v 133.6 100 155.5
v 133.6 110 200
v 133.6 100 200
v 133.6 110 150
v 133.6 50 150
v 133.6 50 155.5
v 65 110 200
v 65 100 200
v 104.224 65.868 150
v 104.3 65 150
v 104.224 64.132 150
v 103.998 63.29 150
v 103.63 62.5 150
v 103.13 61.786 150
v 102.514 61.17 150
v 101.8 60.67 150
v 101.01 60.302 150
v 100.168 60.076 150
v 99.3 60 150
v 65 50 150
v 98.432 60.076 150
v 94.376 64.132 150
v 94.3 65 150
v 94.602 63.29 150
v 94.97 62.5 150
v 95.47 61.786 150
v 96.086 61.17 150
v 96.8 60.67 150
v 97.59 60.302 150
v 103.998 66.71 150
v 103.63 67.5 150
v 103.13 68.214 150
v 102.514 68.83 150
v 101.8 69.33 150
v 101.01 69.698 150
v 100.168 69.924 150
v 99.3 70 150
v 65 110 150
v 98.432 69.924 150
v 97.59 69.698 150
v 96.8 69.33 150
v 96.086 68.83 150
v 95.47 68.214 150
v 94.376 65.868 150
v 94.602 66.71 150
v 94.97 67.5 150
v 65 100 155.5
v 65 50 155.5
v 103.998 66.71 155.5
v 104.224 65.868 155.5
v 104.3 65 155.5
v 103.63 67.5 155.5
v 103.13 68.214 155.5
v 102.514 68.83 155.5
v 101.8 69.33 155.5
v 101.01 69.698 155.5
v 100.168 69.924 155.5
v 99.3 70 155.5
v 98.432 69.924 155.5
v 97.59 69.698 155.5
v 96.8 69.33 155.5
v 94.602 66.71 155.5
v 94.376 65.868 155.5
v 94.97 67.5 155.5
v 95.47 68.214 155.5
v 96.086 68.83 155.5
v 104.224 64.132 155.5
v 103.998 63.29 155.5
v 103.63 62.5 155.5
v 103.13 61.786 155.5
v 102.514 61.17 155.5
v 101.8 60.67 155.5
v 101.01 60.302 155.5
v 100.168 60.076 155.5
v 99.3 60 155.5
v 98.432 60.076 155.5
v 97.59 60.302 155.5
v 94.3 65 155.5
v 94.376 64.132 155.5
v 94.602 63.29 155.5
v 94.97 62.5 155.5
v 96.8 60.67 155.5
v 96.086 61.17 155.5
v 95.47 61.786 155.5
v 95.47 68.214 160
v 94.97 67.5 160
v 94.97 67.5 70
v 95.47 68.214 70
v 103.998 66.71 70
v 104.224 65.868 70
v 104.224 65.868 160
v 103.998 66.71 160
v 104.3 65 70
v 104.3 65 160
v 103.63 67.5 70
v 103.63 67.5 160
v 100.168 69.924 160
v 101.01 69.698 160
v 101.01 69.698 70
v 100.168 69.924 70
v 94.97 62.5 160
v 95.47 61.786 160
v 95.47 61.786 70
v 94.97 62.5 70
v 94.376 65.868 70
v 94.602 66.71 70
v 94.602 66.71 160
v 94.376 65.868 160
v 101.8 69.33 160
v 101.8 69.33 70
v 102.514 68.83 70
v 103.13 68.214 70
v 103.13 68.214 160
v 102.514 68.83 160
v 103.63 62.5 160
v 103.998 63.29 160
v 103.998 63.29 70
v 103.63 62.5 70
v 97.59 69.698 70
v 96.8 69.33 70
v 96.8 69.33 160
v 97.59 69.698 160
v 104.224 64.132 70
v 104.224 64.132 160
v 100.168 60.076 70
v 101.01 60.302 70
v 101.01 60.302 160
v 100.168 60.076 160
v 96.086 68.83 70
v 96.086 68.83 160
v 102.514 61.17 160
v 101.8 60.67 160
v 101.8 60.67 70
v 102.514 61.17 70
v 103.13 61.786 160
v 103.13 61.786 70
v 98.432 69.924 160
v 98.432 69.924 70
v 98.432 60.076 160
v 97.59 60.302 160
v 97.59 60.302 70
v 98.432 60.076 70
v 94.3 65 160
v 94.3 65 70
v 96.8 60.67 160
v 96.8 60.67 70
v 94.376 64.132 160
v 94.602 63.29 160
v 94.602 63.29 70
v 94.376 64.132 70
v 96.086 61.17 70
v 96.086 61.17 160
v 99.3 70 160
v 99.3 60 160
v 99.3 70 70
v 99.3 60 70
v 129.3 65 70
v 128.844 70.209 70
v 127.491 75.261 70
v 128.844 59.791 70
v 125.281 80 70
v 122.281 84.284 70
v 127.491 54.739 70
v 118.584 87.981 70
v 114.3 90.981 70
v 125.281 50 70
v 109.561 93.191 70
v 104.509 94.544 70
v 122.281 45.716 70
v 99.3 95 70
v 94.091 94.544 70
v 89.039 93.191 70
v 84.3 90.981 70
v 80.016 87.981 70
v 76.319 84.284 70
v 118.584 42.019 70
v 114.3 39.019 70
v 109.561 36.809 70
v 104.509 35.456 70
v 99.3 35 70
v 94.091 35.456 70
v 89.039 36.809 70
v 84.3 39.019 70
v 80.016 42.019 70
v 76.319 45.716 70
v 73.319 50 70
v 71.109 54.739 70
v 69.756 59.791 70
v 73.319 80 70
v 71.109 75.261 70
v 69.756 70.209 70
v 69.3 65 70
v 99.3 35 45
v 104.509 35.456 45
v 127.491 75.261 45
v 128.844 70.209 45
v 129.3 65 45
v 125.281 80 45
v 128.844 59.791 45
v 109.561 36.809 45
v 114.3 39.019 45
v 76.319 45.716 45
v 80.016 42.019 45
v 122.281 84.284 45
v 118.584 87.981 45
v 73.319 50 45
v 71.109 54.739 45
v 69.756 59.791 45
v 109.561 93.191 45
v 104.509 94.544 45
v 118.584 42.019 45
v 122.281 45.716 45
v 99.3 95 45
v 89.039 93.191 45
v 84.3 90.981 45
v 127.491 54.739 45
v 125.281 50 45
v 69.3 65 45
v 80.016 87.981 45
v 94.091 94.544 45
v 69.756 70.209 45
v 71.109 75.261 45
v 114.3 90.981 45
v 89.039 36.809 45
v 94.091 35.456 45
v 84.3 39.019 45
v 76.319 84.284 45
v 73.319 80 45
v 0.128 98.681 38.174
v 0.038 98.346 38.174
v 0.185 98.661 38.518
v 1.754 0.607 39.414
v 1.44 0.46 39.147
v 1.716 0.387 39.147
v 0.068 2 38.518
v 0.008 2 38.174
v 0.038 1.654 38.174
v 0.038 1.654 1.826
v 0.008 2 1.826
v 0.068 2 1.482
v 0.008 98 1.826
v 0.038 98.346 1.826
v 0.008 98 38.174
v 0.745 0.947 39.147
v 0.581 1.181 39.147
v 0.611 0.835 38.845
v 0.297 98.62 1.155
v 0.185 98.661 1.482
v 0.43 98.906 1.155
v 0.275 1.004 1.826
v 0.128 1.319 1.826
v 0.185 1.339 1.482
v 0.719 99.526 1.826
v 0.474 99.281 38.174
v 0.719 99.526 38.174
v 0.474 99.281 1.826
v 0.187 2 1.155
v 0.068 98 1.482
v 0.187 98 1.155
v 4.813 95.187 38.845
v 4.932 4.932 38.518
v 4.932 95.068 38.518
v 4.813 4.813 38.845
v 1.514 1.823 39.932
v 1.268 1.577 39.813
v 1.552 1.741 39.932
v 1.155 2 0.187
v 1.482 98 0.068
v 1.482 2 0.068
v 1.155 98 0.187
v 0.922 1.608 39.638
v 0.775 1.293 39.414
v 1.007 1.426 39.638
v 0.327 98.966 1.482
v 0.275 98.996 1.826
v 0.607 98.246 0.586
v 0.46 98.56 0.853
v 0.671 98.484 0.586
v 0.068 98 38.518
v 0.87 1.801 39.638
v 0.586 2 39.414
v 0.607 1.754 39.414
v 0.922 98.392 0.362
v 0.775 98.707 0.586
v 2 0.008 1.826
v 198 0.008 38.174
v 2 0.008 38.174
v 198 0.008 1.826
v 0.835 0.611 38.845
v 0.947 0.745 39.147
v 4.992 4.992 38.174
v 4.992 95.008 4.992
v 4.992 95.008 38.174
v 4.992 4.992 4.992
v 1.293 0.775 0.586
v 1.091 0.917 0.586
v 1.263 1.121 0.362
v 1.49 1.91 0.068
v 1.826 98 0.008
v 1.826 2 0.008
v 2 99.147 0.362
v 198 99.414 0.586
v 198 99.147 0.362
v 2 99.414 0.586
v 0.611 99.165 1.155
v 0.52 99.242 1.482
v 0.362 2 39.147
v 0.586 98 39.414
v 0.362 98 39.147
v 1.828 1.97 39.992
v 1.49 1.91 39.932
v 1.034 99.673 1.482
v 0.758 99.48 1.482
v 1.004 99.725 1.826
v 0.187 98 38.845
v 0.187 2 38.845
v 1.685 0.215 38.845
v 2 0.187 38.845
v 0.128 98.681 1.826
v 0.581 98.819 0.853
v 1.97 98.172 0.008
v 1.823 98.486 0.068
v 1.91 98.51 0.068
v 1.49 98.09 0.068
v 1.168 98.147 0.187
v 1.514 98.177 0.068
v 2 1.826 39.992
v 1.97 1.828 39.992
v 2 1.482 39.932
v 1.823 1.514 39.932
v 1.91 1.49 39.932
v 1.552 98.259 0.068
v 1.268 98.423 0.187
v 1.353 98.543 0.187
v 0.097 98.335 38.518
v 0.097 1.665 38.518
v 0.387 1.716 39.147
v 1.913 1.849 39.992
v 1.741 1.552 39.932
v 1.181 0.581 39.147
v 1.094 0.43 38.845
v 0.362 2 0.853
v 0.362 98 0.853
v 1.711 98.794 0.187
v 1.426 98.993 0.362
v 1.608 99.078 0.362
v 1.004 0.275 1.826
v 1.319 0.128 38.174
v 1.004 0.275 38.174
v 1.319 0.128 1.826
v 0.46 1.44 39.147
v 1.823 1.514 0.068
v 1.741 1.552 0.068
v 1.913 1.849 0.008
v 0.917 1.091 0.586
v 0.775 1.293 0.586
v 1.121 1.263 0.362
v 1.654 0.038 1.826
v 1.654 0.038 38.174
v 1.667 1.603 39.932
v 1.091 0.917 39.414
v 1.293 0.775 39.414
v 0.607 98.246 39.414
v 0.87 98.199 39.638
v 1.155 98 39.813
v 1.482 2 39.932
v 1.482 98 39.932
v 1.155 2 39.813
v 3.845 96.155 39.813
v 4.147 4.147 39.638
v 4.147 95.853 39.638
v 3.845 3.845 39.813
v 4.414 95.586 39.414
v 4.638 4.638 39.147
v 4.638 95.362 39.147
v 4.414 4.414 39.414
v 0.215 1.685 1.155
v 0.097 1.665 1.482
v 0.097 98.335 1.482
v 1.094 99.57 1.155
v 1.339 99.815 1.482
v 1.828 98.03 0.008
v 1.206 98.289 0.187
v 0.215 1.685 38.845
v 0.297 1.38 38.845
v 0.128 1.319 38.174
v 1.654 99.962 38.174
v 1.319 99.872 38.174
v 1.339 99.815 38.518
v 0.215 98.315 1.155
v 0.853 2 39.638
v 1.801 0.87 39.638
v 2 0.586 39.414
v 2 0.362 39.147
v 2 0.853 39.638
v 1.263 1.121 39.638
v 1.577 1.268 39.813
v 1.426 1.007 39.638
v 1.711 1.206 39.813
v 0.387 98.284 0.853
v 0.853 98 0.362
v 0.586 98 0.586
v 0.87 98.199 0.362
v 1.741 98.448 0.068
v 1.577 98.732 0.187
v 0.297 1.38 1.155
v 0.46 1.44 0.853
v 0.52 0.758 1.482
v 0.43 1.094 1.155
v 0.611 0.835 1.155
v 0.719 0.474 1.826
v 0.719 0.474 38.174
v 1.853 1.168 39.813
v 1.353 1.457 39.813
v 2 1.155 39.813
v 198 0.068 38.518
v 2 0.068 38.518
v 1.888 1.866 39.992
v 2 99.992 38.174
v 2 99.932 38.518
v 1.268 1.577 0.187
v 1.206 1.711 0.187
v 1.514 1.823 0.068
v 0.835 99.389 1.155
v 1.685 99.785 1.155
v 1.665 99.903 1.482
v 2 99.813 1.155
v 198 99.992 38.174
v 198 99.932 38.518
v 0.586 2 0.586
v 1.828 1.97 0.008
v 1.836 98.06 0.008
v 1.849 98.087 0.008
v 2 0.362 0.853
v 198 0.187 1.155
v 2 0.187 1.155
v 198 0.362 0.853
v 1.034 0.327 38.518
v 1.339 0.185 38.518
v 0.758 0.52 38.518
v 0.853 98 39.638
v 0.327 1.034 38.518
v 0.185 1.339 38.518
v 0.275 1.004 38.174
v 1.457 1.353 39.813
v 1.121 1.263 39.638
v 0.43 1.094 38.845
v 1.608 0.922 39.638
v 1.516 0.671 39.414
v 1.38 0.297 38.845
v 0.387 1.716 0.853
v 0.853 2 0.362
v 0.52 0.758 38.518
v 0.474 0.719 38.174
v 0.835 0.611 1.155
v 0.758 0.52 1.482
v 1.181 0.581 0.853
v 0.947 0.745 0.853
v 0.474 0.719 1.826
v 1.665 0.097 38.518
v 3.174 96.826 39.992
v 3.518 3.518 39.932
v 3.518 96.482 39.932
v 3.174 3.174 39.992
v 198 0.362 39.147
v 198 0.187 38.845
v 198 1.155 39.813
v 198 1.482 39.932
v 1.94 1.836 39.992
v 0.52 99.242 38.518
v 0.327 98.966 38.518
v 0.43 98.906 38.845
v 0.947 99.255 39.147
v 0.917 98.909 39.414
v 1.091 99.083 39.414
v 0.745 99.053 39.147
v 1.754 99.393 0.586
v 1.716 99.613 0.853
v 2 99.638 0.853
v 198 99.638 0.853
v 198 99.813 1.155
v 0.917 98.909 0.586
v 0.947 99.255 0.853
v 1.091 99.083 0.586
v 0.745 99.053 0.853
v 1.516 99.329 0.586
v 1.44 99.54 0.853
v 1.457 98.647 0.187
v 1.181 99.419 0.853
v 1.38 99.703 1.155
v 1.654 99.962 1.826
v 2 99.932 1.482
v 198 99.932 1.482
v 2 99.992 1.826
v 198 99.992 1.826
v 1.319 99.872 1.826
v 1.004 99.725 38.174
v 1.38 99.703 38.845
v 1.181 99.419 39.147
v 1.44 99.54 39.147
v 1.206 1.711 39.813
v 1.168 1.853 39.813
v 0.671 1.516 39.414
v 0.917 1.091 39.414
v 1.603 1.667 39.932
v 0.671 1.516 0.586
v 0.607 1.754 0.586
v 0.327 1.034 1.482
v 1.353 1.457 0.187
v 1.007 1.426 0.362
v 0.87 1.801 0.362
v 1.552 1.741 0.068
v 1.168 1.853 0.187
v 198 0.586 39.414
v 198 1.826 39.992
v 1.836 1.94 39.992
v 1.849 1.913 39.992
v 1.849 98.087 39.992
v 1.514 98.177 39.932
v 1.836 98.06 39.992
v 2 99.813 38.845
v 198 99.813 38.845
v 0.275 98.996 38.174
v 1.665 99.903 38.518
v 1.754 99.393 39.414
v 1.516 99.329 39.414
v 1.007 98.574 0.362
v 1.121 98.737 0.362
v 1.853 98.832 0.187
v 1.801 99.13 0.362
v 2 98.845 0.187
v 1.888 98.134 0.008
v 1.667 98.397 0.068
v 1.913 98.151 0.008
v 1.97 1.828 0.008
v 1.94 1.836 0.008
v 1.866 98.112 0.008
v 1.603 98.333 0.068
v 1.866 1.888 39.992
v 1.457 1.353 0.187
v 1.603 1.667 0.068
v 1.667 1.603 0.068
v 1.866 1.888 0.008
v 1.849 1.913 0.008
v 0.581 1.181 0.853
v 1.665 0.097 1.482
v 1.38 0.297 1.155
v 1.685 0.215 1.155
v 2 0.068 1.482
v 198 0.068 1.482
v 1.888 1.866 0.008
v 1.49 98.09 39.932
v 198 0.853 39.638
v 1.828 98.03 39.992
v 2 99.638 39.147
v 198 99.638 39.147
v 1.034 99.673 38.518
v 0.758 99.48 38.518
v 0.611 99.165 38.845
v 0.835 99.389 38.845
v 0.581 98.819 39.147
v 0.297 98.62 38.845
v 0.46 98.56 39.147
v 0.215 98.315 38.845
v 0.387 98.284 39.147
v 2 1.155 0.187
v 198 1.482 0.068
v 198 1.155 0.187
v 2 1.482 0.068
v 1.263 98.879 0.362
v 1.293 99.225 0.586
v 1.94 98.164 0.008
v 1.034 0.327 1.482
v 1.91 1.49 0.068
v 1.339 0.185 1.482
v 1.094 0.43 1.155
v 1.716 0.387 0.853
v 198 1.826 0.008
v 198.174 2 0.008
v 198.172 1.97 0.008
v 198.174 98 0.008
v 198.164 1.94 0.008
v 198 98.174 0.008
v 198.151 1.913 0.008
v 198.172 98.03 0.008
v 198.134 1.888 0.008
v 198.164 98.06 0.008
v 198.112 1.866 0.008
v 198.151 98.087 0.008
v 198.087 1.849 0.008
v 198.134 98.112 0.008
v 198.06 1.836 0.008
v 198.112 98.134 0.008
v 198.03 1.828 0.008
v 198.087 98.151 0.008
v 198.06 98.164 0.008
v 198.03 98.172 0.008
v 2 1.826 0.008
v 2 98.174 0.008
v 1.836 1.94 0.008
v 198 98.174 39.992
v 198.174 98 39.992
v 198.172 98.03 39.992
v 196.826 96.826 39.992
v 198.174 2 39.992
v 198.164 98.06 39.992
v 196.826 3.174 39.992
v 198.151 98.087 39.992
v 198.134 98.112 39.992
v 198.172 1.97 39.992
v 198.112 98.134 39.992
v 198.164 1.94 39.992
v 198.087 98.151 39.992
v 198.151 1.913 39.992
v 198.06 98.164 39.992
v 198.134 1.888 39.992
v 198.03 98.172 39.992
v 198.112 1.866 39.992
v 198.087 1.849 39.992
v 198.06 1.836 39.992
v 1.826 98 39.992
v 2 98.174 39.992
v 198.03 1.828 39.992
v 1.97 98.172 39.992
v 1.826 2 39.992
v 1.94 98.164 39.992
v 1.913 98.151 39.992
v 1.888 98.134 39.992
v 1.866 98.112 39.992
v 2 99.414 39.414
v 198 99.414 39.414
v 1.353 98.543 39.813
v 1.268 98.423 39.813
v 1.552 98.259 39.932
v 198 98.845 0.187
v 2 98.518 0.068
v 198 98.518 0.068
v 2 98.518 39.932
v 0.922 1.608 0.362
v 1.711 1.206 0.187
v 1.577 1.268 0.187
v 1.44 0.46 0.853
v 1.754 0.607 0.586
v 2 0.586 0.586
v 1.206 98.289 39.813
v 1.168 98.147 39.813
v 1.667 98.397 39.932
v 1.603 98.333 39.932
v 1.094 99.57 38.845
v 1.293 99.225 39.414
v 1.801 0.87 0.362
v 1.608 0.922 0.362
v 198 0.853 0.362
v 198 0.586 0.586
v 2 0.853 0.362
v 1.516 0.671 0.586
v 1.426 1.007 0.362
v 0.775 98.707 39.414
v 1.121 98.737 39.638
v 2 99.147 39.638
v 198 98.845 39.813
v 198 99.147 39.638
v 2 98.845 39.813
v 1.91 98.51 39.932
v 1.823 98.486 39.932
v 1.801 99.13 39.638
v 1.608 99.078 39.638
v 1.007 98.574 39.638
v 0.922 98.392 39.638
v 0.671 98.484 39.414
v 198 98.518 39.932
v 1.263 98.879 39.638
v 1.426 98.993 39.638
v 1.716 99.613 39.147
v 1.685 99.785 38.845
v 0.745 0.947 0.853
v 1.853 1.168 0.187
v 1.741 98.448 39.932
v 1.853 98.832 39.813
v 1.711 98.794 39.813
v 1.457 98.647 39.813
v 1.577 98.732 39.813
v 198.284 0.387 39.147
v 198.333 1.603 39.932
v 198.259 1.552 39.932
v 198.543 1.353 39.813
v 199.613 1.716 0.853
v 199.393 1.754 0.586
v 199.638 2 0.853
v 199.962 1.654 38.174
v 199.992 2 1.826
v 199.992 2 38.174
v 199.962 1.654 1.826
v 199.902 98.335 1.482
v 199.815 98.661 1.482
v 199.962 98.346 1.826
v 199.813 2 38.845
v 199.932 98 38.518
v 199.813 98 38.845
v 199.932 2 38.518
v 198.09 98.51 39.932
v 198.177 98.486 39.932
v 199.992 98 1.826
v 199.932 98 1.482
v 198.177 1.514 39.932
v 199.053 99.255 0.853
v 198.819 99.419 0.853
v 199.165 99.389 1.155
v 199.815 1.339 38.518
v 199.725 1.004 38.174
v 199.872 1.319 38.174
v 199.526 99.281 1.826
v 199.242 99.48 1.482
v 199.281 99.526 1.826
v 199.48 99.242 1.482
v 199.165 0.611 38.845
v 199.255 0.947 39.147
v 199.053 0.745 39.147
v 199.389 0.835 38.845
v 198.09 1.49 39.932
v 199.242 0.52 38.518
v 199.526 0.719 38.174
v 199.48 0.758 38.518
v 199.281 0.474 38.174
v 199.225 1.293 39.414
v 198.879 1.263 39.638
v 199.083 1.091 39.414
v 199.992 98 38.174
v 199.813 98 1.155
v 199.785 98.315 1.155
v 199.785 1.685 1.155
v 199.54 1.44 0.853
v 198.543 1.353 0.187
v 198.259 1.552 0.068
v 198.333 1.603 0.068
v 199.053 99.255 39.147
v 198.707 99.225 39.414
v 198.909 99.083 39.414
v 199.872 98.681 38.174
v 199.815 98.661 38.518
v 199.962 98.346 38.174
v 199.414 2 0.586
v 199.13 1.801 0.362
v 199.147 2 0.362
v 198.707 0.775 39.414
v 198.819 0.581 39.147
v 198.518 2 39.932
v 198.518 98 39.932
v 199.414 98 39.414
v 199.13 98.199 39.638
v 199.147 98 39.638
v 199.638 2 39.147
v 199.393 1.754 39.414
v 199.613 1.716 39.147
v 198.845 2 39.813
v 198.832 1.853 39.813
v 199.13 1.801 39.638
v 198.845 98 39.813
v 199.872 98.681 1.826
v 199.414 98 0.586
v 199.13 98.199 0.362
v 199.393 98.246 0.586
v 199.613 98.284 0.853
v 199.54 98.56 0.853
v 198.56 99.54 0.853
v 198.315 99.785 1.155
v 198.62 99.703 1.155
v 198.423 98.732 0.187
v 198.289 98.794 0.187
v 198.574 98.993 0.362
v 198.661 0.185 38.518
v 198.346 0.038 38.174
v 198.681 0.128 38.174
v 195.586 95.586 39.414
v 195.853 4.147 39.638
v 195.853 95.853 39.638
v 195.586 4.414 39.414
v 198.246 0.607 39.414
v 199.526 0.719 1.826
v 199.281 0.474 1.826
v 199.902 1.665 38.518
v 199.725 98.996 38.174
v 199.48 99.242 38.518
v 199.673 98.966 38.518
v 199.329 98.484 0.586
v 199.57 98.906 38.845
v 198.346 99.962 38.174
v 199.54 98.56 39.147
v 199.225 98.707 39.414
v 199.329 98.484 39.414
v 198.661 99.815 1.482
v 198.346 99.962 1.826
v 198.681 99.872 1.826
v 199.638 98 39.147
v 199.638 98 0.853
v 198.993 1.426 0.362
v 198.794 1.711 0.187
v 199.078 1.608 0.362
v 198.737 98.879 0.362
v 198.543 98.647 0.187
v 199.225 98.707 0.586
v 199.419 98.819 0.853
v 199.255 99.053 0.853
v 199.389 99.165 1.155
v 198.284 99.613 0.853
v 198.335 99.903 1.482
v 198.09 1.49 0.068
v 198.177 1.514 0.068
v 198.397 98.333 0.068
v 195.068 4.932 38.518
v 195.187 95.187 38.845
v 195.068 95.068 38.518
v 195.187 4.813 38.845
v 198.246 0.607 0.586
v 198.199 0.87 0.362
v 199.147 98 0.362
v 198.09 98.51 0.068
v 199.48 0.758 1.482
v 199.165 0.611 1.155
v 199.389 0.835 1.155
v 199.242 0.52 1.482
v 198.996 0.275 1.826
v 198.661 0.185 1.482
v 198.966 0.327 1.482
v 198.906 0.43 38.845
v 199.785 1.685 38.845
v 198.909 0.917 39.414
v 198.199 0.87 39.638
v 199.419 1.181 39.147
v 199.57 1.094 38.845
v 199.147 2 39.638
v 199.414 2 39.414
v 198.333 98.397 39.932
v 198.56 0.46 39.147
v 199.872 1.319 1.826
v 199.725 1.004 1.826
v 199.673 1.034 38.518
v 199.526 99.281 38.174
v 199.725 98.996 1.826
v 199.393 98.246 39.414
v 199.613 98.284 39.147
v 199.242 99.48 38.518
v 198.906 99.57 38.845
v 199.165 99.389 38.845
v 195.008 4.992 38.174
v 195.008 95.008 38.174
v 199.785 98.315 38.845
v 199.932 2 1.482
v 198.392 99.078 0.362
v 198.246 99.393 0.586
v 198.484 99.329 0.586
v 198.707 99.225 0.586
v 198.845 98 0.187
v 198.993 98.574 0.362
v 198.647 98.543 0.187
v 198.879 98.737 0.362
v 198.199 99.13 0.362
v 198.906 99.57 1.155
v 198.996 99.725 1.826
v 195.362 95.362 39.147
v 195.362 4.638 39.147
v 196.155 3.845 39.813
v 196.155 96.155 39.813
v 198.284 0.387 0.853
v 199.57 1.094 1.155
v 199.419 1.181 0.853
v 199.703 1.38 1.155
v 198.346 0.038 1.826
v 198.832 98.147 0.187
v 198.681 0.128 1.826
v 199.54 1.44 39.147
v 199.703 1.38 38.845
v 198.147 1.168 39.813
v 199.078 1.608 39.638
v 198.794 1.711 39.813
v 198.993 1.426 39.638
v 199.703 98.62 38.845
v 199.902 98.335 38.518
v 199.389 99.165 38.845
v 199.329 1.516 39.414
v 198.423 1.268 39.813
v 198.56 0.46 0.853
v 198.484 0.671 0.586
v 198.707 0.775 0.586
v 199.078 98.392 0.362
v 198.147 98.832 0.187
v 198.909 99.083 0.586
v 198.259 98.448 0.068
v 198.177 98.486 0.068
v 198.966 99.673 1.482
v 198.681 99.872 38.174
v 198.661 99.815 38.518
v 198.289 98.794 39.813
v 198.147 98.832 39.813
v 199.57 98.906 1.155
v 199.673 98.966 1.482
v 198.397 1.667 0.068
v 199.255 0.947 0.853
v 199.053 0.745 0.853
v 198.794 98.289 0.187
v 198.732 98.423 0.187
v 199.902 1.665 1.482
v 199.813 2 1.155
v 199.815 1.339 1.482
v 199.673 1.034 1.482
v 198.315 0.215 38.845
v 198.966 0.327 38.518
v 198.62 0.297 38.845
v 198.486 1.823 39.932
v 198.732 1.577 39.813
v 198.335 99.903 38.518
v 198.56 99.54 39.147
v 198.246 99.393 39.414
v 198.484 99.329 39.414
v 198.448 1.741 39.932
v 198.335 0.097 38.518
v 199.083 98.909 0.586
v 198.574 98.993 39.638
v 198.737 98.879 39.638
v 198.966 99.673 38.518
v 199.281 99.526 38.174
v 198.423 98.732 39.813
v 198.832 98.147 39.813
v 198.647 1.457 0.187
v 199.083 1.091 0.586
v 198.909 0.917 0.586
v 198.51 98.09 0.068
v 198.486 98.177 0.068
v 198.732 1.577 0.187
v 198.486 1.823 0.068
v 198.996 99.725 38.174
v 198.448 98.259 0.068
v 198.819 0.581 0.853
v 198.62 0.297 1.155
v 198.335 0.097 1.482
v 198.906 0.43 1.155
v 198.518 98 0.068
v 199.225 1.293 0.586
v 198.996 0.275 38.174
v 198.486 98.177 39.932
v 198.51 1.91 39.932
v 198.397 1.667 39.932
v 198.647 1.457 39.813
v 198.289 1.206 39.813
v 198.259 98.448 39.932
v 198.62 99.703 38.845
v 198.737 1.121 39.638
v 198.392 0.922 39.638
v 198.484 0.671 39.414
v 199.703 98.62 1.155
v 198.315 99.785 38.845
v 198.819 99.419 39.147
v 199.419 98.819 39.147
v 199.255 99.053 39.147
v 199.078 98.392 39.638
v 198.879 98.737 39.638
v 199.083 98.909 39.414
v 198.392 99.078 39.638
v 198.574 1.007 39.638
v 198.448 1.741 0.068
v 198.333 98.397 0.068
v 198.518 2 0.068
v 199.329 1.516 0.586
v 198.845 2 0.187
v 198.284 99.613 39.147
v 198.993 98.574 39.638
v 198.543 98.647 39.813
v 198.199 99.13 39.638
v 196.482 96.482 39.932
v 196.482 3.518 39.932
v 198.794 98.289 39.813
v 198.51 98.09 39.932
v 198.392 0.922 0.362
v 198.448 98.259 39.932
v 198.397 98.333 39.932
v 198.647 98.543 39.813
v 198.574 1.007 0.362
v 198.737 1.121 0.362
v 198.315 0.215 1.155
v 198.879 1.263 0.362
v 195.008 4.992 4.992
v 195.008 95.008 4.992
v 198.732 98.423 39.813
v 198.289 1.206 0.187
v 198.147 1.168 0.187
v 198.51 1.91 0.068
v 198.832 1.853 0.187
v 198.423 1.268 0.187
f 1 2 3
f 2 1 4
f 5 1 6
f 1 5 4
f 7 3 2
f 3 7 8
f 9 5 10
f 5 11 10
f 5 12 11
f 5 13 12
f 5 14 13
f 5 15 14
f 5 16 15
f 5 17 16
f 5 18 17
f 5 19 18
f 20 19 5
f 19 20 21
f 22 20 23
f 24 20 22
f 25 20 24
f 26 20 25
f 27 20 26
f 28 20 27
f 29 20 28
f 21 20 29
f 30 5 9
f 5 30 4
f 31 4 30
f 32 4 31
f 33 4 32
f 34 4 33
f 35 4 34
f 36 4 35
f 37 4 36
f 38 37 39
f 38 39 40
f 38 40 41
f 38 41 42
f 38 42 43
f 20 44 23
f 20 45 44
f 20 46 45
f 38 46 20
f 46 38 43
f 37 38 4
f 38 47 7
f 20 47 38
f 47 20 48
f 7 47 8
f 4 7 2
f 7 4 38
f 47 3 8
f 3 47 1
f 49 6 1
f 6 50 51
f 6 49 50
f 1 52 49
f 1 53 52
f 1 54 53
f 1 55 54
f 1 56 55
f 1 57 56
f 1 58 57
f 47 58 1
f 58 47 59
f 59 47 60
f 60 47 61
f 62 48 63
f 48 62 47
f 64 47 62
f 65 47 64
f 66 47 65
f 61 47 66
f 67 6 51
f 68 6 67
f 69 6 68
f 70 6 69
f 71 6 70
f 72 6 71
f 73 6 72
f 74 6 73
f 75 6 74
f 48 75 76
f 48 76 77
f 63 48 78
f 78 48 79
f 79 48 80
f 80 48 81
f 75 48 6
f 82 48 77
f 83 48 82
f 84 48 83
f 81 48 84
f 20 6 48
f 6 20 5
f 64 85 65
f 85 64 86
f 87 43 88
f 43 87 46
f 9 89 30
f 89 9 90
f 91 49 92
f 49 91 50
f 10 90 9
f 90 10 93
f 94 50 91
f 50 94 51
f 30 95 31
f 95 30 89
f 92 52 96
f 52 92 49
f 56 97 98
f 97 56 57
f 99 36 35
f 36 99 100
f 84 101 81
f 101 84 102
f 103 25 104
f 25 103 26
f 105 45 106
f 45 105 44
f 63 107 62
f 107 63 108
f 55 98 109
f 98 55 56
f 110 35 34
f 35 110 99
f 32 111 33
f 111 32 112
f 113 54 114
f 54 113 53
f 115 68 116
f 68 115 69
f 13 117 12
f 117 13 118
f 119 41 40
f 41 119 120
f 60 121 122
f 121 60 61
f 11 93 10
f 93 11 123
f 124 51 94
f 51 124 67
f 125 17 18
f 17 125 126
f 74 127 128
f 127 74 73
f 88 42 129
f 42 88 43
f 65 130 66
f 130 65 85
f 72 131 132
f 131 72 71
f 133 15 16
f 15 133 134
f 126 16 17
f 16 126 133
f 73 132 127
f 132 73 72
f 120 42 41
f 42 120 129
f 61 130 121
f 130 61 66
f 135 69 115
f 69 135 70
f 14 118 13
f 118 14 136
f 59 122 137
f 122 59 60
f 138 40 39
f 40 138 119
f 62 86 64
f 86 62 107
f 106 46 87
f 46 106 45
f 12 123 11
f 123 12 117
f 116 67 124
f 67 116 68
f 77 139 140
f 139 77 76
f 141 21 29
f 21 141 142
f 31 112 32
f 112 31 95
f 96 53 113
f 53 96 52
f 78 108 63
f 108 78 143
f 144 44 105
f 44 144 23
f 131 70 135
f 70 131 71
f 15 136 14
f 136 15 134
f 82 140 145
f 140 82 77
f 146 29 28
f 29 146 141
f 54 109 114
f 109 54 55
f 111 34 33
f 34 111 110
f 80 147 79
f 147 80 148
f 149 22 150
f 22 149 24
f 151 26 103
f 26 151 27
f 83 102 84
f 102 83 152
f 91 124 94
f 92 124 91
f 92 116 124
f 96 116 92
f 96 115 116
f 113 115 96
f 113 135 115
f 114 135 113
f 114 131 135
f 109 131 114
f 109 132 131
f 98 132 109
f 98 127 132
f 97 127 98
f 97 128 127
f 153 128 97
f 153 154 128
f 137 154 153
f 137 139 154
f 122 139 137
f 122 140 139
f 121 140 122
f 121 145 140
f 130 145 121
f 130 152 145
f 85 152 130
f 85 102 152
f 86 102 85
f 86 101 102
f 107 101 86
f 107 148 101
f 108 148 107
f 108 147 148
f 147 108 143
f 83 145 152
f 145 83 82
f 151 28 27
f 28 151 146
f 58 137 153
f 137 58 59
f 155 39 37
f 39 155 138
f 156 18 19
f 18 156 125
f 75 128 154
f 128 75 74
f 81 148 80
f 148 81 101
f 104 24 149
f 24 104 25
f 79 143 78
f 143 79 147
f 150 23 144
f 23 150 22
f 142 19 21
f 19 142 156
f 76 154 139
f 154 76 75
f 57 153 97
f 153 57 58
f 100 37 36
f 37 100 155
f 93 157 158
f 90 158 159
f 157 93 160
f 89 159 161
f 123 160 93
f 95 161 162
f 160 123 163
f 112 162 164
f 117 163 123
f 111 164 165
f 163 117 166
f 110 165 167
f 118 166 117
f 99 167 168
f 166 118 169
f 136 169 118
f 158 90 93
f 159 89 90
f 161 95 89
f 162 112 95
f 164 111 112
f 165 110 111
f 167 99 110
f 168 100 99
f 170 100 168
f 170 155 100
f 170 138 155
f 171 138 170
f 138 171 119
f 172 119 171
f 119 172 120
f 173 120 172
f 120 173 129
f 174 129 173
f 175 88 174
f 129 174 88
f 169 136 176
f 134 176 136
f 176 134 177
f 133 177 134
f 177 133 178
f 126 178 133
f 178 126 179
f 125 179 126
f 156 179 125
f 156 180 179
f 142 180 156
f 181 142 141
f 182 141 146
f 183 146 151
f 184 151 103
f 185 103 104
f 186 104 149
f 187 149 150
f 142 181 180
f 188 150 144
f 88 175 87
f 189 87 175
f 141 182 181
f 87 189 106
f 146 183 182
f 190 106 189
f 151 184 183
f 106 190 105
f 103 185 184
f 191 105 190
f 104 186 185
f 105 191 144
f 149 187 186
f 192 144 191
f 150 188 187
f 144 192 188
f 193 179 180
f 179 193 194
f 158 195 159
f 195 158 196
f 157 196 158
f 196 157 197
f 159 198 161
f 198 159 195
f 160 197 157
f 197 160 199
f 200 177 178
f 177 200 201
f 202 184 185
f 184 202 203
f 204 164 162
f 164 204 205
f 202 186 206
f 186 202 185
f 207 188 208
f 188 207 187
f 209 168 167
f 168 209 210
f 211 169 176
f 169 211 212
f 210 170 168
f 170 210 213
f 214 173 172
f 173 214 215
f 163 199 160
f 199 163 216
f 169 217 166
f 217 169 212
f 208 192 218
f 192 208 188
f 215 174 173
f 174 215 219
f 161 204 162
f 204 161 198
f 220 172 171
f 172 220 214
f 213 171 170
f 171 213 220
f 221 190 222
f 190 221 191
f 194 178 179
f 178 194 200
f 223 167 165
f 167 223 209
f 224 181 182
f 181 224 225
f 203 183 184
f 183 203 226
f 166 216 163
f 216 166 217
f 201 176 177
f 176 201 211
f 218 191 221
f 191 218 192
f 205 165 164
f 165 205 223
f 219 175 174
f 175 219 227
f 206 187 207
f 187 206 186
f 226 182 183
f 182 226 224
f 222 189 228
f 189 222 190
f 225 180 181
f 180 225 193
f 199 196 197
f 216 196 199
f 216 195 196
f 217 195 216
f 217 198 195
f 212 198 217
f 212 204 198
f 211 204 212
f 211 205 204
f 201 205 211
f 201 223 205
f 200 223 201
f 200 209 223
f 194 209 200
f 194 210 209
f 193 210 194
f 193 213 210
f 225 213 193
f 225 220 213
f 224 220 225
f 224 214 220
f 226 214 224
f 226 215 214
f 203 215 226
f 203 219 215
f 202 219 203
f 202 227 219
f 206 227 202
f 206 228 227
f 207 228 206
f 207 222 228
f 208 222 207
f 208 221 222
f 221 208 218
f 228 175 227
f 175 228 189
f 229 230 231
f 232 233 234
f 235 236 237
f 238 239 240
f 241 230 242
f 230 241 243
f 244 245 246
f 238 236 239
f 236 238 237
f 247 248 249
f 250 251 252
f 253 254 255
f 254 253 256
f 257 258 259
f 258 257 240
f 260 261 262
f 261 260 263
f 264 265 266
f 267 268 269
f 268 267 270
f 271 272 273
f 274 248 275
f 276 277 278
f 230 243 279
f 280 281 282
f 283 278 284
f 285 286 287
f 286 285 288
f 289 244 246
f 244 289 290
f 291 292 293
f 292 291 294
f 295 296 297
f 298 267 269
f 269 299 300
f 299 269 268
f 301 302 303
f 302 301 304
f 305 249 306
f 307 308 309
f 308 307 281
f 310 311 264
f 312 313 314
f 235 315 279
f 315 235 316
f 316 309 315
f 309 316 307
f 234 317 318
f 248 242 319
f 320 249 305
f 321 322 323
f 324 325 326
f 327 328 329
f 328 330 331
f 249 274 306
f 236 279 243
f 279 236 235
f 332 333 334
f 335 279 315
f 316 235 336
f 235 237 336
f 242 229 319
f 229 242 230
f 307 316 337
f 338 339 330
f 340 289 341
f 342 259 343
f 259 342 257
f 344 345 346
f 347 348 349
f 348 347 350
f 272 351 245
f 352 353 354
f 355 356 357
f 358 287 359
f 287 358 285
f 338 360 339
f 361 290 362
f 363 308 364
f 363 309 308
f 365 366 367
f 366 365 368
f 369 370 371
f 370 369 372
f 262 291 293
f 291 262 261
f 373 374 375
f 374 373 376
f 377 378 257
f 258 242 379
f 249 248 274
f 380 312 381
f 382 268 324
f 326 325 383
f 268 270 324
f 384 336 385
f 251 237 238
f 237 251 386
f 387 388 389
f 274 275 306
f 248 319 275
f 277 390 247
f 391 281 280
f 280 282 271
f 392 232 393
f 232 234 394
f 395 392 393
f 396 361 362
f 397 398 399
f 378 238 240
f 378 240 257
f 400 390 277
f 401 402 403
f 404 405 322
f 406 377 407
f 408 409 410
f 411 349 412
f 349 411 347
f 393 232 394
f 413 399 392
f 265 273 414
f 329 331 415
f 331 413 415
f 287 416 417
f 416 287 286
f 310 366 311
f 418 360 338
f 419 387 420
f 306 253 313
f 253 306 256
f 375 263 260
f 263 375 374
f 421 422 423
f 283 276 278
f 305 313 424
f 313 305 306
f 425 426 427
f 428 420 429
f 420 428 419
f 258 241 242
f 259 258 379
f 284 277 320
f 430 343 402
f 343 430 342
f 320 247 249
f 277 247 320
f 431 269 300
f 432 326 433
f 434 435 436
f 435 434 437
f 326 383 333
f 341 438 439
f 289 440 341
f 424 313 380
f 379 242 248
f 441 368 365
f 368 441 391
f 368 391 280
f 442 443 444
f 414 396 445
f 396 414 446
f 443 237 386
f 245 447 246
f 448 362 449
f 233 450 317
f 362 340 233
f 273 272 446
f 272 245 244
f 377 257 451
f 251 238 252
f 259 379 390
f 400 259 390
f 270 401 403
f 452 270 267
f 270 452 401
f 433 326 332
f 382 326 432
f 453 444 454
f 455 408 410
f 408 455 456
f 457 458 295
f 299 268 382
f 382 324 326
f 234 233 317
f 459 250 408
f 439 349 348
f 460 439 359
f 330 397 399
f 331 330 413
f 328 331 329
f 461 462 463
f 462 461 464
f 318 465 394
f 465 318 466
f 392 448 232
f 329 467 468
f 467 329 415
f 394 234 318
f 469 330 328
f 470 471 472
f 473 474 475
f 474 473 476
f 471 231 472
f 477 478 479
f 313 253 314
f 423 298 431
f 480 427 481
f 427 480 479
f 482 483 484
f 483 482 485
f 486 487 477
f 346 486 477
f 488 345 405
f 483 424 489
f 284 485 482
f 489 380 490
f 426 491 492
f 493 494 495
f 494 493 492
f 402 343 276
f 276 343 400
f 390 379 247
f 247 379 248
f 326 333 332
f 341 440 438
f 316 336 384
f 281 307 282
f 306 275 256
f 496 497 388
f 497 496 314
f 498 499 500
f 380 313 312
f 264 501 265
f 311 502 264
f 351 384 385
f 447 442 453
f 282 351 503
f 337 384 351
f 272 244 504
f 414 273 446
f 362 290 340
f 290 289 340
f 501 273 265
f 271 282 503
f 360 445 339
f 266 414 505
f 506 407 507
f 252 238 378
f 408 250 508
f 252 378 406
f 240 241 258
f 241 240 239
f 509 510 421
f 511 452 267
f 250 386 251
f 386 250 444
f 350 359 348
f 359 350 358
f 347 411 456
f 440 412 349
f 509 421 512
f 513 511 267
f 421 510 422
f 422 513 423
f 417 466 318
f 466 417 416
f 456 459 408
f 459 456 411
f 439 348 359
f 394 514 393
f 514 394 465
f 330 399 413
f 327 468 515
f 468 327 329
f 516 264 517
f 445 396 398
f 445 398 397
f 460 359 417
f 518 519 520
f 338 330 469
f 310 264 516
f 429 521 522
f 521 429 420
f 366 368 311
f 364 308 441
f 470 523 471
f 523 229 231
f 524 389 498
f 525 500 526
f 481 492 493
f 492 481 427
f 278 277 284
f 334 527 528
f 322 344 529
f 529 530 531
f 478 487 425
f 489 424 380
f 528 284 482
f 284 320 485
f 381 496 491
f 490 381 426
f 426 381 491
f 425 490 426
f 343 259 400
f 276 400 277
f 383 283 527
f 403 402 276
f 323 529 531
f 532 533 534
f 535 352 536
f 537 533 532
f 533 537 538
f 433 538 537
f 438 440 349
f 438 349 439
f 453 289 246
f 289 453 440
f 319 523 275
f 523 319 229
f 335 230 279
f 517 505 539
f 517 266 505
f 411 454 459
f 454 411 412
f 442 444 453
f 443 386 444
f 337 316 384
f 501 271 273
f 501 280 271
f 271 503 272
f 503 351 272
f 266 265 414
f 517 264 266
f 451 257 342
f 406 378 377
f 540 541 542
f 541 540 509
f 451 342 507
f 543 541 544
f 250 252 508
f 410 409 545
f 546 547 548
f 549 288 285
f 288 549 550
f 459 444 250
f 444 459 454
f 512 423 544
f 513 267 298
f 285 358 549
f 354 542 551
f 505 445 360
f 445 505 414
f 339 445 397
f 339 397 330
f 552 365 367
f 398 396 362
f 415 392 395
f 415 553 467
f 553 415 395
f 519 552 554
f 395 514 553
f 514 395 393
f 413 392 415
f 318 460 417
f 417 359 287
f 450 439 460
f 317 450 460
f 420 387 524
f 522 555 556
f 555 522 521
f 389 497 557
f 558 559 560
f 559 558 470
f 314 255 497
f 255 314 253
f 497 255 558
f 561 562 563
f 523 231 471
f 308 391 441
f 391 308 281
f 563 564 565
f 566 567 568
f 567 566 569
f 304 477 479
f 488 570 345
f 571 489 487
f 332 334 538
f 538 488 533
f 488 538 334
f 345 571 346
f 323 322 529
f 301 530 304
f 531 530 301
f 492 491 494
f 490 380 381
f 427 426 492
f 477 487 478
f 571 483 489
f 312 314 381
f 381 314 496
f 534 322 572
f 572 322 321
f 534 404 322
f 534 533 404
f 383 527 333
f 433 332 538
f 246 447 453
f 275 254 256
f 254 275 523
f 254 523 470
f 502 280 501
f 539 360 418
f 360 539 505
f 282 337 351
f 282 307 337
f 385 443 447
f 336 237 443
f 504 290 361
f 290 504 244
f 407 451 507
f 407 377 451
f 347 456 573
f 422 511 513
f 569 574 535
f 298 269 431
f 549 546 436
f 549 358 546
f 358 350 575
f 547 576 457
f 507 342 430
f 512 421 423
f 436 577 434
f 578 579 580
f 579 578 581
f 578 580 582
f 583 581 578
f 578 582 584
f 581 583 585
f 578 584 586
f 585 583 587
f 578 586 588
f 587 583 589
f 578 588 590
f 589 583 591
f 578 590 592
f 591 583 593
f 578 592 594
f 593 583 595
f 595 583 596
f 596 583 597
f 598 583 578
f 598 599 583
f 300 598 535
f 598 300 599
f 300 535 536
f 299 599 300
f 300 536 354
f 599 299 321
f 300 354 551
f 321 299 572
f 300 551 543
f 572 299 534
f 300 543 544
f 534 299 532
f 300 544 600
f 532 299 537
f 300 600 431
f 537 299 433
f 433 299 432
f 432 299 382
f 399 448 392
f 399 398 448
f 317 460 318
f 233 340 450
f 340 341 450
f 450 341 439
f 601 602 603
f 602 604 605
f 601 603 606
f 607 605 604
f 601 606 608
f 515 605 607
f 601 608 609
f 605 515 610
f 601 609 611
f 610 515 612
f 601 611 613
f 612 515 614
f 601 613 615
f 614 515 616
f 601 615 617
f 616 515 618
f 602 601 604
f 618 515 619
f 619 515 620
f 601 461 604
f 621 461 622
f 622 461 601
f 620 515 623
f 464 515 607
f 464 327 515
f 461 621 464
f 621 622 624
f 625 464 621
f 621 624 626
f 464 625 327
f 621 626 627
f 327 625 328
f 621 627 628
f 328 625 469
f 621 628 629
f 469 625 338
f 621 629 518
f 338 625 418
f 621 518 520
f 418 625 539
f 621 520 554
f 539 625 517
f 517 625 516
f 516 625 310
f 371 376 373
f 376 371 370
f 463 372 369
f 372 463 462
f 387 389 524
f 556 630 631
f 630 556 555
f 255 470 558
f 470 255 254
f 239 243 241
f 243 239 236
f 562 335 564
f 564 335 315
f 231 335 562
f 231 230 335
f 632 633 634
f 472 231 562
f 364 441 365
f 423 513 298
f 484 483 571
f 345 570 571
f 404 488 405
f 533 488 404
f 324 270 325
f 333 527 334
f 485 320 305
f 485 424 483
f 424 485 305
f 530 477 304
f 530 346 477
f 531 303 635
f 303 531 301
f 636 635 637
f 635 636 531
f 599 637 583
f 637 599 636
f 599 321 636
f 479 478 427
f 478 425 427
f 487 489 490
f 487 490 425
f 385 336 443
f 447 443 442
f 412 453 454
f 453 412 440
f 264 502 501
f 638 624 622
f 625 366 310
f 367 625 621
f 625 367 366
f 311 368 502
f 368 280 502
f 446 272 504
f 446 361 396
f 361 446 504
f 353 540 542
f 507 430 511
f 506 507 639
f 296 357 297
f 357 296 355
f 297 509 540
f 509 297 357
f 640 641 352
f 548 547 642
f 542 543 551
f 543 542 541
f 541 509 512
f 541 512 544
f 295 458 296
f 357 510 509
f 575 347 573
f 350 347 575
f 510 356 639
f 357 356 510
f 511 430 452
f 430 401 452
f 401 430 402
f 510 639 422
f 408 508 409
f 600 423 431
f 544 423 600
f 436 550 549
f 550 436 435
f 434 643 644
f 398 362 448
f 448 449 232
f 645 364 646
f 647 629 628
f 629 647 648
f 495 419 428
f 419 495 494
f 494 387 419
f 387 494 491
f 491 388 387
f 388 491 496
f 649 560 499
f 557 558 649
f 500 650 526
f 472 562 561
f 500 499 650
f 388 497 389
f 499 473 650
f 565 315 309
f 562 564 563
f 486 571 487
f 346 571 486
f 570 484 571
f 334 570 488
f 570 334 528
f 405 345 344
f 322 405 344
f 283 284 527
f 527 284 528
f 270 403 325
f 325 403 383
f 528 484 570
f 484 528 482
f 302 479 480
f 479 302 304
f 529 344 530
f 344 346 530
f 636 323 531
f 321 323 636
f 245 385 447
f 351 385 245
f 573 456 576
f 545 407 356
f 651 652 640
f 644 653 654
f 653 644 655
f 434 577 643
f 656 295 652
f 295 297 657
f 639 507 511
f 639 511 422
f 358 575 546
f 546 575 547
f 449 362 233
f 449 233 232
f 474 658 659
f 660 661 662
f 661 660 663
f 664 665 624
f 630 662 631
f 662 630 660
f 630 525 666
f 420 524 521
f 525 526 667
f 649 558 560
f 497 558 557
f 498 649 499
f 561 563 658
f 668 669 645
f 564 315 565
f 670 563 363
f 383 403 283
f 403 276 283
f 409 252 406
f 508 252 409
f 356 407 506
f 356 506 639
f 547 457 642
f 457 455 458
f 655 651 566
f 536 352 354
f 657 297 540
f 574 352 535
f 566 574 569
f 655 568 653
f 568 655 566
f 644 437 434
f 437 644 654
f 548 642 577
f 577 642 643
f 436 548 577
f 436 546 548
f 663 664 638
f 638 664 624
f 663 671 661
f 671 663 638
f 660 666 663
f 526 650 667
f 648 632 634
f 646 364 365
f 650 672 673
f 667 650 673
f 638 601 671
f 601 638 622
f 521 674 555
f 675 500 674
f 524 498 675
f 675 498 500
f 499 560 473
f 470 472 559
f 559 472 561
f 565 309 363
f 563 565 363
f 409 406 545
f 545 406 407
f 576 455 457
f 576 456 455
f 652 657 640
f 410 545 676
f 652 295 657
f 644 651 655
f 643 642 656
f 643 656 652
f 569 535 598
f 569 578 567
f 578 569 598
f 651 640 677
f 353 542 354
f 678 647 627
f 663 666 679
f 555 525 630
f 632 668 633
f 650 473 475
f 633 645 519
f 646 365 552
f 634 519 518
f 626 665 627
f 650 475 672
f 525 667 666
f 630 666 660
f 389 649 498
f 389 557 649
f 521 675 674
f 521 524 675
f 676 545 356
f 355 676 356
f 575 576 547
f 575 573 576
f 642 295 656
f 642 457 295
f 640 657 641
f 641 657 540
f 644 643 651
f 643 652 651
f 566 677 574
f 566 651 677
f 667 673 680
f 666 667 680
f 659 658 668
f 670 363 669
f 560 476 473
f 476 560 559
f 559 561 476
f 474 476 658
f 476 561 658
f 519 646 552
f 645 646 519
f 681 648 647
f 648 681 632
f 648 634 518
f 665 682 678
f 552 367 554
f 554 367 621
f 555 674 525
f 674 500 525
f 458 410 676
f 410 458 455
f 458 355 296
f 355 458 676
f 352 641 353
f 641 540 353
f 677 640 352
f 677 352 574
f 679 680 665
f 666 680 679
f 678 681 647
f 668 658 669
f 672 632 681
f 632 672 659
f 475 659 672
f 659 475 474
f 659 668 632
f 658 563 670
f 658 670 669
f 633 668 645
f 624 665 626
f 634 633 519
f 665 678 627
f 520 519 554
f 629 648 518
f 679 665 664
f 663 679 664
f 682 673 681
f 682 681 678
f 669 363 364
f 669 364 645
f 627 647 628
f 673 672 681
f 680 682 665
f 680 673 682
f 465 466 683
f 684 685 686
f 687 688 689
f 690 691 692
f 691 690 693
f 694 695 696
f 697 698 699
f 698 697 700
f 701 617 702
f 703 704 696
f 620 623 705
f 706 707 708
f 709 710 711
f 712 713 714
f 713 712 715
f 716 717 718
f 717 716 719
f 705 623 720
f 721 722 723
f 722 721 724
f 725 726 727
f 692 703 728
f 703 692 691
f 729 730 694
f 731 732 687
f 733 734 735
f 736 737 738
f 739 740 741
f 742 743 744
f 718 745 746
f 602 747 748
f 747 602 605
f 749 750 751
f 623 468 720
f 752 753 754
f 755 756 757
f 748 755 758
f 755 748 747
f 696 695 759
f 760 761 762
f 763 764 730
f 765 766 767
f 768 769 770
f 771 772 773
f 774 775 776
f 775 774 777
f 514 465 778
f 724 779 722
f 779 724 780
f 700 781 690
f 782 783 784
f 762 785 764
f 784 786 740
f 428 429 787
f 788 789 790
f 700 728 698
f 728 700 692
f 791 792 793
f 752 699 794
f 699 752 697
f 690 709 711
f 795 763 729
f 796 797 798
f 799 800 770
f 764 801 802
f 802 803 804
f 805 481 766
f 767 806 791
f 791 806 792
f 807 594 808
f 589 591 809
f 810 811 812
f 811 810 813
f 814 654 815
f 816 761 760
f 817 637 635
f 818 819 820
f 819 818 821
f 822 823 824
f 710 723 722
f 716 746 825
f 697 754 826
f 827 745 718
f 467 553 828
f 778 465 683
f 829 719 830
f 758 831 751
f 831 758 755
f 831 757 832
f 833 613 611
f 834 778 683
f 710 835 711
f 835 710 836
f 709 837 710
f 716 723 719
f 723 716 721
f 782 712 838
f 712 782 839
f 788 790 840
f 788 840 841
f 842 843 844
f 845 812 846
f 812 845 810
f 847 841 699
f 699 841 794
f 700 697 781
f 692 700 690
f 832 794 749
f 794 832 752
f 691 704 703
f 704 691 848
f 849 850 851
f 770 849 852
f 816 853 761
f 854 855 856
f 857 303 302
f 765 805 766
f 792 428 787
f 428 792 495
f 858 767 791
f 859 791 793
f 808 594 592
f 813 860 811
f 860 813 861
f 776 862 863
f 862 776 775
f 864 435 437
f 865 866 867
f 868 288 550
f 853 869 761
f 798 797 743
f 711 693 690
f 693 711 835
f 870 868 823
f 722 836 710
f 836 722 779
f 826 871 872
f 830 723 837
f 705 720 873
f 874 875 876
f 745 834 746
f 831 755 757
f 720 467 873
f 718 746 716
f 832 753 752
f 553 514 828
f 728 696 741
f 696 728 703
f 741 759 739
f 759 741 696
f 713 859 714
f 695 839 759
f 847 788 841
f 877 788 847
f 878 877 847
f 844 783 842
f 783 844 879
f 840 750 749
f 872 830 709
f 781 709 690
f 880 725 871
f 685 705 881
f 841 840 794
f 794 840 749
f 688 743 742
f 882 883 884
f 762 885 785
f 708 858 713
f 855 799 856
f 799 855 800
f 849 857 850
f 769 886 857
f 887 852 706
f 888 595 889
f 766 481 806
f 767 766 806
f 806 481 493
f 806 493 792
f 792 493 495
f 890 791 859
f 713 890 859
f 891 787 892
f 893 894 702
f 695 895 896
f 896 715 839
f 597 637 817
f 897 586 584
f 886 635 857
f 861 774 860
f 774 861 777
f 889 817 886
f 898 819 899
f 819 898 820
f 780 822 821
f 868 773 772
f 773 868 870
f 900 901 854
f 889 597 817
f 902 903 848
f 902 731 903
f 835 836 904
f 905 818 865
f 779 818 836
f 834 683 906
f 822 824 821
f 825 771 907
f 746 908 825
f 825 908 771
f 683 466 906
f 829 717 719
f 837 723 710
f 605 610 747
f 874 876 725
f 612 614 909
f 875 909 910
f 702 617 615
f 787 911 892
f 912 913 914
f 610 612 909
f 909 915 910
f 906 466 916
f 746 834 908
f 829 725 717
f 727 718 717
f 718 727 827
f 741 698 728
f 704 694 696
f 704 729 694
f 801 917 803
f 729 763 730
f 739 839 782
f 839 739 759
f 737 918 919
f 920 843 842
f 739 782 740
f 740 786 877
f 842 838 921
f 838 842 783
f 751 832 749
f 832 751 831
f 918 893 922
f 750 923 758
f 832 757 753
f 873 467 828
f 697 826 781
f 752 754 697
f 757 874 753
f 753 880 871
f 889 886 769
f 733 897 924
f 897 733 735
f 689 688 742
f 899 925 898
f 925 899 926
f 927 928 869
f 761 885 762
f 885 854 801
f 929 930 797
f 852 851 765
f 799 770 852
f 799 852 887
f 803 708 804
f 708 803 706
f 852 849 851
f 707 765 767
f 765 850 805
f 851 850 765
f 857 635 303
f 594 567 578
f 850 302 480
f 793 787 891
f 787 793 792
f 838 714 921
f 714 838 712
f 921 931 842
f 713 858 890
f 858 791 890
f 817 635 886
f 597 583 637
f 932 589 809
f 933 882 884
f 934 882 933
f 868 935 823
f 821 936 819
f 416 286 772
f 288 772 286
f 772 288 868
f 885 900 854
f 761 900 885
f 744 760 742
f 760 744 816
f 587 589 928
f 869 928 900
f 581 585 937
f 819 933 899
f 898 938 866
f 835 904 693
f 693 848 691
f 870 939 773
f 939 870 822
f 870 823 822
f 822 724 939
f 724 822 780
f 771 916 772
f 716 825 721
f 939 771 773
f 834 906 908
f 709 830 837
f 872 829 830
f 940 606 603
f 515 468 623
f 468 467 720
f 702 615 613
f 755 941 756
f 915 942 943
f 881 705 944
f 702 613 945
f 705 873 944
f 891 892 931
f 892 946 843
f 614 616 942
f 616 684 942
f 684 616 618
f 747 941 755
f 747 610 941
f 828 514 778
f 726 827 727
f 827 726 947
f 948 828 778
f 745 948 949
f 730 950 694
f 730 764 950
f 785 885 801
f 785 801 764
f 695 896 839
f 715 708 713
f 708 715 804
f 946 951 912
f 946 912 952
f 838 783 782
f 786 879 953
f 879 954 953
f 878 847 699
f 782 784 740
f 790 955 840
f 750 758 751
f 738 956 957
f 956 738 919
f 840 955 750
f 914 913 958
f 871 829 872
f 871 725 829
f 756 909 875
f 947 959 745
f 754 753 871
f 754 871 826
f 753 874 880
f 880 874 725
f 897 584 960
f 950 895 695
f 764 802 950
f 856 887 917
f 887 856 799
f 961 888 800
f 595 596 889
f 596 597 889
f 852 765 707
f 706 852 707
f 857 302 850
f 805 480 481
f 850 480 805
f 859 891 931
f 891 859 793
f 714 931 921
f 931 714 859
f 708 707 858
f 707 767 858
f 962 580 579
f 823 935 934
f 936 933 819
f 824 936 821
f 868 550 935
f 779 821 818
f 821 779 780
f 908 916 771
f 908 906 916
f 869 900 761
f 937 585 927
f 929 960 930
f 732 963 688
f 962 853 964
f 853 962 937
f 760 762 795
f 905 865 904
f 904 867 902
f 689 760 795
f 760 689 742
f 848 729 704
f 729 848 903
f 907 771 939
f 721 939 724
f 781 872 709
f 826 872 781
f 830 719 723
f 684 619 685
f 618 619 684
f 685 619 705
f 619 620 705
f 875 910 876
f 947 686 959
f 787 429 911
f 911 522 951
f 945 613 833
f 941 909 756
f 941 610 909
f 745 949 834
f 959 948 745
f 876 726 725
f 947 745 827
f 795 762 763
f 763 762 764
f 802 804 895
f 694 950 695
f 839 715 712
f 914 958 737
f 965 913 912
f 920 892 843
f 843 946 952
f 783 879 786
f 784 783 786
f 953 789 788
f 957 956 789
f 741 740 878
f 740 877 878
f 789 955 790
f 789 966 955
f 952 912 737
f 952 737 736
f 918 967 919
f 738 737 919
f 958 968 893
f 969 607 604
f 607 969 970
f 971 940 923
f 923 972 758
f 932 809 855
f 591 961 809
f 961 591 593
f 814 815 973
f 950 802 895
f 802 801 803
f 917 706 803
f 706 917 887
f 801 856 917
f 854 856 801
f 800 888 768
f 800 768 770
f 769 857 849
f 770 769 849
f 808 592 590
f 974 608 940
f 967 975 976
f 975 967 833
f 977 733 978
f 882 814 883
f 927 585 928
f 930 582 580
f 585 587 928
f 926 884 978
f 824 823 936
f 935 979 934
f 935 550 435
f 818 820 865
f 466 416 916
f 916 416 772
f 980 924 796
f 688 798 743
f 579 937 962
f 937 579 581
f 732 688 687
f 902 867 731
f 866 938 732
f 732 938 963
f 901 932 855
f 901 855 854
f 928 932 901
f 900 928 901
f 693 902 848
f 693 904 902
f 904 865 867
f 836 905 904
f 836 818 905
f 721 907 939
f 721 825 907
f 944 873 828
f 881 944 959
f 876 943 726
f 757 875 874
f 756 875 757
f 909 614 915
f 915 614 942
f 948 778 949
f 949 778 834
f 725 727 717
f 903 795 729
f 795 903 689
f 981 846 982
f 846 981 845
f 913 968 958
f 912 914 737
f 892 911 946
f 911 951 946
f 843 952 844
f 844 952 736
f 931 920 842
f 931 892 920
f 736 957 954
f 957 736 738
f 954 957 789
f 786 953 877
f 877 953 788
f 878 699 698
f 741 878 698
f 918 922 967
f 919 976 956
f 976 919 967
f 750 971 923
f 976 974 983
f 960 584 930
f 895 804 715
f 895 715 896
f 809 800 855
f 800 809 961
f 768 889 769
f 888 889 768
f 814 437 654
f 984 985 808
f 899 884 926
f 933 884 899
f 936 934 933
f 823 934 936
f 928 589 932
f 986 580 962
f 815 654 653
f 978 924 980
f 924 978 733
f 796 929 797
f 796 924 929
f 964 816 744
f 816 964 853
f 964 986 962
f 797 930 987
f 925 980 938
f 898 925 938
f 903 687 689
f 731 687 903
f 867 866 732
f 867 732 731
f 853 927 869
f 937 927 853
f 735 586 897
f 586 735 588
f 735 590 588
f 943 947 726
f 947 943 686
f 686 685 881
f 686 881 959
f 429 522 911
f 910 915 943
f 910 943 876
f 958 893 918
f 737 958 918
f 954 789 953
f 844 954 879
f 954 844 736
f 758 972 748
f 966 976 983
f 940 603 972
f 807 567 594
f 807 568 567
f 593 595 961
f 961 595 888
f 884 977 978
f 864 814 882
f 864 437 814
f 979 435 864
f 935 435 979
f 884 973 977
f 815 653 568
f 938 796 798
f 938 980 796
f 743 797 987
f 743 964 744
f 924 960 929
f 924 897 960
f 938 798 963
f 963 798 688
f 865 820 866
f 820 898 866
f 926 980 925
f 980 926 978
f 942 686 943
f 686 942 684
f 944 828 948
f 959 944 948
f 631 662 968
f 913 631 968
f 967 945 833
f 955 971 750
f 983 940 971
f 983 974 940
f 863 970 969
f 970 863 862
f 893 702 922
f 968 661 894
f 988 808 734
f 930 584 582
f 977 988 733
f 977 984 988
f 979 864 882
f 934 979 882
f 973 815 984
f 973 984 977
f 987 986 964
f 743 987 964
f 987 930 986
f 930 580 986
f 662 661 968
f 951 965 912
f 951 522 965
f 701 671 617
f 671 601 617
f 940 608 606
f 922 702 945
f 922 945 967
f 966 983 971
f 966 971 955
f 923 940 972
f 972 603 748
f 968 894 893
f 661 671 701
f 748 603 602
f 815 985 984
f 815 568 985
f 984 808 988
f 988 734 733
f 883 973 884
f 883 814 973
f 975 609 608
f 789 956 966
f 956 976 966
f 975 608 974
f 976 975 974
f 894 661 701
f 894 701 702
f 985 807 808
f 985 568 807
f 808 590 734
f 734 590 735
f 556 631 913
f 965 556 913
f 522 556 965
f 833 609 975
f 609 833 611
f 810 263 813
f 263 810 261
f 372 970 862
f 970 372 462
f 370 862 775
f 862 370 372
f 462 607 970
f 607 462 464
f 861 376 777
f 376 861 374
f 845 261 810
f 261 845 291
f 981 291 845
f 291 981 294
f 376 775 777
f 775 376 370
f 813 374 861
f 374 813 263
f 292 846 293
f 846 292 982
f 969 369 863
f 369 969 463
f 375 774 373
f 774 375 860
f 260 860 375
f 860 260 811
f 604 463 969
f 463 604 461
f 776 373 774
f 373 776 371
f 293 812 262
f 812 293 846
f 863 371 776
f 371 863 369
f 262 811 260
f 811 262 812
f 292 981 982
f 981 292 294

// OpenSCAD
$fn=36;

module roundedCube(xdim, ydim, zdim, rdim) {
  hull() {
    translate([rdim,rdim,rdim]) sphere(r=rdim);
    translate([xdim-rdim,rdim,rdim]) sphere(r=rdim);
    translate([rdim,ydim-rdim,rdim]) sphere(r=rdim);
    translate([xdim-rdim,ydim-rdim,rdim]) sphere(r=rdim);
    translate([rdim,rdim,zdim-rdim]) sphere(r=rdim);
    translate([xdim-rdim,rdim,zdim-rdim]) sphere(r=rdim);
    translate([rdim,ydim-rdim,zdim-rdim]) sphere(r=rdim);
    translate([xdim-rdim,ydim-rdim,zdim-rdim]) sphere(r=rdim);
  }
};
//roundedCube(40,30,20,2);

shelf_thickness=5;
spacing=2;
radius=2;

// battery_width=83+3;//test print done at 83
// battery_depth=146+1;//test print done at 146
// battery_height=245;//test print done at 245

desk_mount_width=68.6;
desk_mount_depth=50;
desk_mount_height=5.5;
desk_back_panel_depth=10;
desk_back_panel_height=50;
screw_diameter=10;
screw_radius=screw_diameter/2;
screw_height=90;
knob_diameter=60;
knob_radius=knob_diameter/2;
knob_height=25;

bucket_width=200;
bucket_depth=100;
bucket_edge=40;

module table() {
  color("Blue") {
    translate([0,desk_mount_depth,0]) cube([desk_mount_width,desk_back_panel_depth,desk_back_panel_height]);
    cube([desk_mount_width,desk_mount_depth,desk_mount_height]);
  }
  color("Green") {
    translate([desk_mount_width/2,3*screw_radius,-screw_height+screw_diameter]) cylinder(h = screw_height, r = screw_radius);
    translate([desk_mount_width/2,3*screw_radius,-screw_height-knob_height+screw_diameter]) cylinder(h = knob_height, r = knob_radius);
  }
}

module bucket() {
  module bucketSide() {
    roundedCube(
      shelf_thickness,
      bucket_depth,
      bucket_edge,
      radius);
  }
  module bucketFace() {
    roundedCube(
      bucket_width,
      shelf_thickness,
      bucket_edge,
      radius);
  }
  module bucketFloor() {
    roundedCube(
      bucket_width,
      bucket_depth,
      shelf_thickness,
      radius);
  }
  bucketSide();
  translate([bucket_width-shelf_thickness,0,0]) bucketSide();
  bucketFace();
  translate([0,bucket_depth-shelf_thickness,0]) bucketFace();
  bucketFloor();
}

translate([65,50,150]) table();
module mount() {
  color("Red") {
    bucket();

  }
}
mount();
